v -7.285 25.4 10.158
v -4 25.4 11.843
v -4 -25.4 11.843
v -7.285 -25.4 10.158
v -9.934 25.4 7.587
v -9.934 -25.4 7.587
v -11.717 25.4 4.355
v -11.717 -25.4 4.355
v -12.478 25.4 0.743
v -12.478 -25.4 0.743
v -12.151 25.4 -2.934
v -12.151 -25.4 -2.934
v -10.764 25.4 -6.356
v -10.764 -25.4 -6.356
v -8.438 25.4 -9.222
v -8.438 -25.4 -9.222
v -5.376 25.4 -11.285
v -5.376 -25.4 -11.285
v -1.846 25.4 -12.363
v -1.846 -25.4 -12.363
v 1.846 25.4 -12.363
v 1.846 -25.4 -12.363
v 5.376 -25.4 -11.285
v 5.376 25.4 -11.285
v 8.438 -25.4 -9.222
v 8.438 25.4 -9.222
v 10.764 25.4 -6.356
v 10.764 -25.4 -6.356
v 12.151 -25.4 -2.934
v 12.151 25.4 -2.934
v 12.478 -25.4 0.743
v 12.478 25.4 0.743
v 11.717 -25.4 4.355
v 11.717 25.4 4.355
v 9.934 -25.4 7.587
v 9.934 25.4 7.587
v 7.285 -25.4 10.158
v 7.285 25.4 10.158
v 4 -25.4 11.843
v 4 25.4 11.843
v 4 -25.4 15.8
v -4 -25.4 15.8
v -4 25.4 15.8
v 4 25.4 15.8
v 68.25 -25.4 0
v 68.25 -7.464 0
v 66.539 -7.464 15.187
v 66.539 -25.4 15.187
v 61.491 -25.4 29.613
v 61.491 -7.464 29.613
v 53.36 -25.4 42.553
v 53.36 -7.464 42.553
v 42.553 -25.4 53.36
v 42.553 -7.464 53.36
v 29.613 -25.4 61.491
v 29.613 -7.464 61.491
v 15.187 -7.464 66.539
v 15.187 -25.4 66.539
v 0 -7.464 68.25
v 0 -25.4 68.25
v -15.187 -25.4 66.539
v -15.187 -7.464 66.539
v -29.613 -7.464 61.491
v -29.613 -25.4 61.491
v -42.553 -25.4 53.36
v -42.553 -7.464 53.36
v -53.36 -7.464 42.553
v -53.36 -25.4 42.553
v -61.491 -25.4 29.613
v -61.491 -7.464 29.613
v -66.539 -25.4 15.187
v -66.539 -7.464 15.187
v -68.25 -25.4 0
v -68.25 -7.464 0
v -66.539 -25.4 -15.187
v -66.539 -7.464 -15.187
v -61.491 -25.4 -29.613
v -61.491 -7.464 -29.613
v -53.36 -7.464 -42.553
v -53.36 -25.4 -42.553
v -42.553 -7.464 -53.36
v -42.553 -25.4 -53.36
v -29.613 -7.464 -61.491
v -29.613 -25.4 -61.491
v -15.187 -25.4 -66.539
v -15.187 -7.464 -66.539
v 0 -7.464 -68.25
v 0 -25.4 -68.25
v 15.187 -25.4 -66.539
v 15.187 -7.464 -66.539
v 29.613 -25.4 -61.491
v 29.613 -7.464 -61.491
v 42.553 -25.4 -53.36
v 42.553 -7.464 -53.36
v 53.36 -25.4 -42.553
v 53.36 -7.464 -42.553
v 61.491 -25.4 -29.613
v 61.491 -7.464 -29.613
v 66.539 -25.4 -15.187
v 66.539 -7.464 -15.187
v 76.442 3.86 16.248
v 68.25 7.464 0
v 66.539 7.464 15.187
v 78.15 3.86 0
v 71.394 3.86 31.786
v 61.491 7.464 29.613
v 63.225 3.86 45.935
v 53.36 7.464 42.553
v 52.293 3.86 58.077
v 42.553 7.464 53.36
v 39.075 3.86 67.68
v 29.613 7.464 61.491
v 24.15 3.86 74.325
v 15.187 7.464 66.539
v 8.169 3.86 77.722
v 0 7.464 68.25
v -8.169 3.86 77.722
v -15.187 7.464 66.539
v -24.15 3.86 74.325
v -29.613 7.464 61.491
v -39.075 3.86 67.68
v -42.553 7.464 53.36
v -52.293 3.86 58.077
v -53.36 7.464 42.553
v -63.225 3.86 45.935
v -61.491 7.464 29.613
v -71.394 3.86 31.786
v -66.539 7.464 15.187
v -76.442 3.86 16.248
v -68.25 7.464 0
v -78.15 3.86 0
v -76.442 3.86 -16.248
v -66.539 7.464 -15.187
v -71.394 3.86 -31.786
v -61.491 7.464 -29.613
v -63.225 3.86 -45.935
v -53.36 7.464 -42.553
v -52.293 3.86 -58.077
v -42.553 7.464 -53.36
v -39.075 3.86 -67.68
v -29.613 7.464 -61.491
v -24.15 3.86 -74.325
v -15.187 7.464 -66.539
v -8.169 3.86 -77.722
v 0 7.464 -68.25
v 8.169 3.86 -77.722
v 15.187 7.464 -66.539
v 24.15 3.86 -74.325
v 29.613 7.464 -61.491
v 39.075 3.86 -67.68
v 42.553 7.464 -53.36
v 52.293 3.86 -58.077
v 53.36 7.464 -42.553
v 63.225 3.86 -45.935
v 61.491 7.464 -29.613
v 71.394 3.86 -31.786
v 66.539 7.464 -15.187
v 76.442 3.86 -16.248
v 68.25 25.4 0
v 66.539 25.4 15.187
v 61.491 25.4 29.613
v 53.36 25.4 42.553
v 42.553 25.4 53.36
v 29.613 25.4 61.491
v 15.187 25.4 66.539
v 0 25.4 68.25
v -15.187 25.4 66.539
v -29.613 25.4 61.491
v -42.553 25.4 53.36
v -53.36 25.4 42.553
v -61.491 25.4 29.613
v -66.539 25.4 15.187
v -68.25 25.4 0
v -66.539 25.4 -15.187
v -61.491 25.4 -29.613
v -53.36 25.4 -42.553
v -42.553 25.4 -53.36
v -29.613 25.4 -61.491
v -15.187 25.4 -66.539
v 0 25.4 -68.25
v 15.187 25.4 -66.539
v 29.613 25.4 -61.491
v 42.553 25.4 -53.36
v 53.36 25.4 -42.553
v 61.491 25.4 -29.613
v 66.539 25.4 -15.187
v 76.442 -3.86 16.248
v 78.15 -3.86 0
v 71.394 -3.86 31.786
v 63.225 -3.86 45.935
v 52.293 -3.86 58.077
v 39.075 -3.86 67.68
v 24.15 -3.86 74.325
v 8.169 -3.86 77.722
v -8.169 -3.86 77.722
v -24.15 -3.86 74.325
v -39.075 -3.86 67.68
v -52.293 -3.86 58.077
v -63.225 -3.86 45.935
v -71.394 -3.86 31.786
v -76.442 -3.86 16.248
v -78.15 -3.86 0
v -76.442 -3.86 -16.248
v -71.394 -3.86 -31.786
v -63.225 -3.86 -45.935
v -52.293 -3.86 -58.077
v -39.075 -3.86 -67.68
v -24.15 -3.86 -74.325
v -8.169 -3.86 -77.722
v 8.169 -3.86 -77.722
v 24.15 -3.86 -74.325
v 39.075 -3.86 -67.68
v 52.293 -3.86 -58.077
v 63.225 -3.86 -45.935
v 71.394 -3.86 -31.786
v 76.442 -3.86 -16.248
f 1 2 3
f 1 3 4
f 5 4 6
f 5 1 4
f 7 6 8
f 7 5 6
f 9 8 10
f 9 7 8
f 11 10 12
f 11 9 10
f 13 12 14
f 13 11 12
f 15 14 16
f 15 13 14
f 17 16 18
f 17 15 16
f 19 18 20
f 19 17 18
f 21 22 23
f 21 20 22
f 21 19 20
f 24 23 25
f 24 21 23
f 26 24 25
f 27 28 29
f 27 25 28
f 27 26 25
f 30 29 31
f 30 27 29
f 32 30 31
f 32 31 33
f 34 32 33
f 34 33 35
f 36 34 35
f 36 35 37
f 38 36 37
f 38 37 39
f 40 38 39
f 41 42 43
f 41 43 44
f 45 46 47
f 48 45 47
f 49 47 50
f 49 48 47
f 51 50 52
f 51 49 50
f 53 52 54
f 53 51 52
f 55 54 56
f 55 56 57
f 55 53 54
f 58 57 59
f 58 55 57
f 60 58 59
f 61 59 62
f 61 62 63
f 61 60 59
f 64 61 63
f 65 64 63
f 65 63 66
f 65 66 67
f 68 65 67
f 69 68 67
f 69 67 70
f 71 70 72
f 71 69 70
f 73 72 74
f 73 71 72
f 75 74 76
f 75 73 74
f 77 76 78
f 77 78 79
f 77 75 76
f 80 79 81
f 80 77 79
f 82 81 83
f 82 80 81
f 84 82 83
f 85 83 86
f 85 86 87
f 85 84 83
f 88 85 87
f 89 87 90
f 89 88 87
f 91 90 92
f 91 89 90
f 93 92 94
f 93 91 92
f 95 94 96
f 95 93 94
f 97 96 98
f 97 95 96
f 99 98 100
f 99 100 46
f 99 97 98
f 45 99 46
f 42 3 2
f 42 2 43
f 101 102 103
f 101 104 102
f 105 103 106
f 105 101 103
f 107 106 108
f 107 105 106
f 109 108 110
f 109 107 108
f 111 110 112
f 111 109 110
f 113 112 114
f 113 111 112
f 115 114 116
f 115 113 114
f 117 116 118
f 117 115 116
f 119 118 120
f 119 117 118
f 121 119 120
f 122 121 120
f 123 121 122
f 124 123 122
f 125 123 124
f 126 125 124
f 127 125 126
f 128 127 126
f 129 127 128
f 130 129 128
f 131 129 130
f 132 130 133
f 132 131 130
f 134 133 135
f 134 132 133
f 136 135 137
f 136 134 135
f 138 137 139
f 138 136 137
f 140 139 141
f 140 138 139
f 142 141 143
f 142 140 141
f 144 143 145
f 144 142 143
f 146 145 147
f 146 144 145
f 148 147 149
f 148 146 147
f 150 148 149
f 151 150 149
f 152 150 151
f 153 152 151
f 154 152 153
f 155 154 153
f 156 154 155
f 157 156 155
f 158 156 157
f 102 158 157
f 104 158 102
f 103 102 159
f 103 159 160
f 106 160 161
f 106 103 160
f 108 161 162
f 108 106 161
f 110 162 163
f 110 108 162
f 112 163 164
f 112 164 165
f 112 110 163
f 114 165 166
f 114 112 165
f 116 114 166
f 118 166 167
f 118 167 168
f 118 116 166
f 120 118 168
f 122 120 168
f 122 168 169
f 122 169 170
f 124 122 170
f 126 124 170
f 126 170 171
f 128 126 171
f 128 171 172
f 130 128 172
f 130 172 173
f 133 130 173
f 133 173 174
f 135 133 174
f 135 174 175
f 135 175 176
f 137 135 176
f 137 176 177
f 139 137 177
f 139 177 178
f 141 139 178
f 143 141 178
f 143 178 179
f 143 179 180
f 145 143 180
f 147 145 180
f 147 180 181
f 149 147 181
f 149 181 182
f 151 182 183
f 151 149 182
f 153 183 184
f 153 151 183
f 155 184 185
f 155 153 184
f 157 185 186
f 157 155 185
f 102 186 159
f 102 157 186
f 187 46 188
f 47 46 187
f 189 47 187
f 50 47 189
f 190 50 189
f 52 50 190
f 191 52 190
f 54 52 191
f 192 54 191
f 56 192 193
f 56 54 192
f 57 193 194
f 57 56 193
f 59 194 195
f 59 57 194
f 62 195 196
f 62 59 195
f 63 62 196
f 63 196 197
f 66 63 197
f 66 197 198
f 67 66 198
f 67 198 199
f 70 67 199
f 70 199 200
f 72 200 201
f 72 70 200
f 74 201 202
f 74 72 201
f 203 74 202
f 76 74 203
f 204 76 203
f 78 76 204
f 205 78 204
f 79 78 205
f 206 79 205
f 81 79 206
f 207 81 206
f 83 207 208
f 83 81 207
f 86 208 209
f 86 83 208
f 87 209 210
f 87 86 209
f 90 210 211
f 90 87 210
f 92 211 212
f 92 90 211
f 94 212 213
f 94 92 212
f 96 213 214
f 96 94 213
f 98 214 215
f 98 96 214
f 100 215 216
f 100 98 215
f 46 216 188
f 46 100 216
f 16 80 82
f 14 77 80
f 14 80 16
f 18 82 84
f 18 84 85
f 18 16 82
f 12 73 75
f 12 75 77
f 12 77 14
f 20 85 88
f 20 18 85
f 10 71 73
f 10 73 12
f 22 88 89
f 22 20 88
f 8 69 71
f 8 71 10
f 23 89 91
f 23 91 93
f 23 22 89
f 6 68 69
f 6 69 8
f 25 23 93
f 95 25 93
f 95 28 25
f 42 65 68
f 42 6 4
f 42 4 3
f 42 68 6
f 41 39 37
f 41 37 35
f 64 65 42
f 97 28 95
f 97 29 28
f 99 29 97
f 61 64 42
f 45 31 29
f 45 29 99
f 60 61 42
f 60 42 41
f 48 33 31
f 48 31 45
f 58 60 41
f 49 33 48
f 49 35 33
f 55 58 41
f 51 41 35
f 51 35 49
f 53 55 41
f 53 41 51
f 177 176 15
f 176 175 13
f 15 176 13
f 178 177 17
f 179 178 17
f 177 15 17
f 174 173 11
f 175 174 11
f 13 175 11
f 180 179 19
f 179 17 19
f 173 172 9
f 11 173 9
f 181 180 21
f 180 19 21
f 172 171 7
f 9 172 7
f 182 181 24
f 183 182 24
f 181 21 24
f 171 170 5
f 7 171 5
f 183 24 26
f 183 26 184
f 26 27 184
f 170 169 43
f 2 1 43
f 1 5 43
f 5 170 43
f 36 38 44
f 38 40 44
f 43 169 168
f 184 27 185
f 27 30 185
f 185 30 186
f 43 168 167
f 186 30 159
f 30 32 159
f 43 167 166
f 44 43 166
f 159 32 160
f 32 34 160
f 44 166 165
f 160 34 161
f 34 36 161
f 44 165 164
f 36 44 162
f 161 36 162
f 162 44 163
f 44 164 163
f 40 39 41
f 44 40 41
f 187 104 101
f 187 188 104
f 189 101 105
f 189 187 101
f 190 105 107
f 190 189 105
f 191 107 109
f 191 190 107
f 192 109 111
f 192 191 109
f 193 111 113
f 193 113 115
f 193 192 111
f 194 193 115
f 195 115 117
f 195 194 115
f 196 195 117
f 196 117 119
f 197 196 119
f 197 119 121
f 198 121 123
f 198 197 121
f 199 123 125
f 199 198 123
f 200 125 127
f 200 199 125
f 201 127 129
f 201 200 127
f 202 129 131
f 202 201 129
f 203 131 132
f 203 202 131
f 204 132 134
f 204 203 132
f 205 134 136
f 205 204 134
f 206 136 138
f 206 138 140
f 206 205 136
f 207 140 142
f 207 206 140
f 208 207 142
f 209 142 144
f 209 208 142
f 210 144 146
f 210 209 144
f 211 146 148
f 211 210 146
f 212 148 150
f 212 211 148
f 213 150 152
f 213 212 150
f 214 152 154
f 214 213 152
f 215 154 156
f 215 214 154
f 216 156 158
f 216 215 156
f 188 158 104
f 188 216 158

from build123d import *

# Parameters (mm, degrees)
F0_R         = 68.25
F0_R_2       = 12.5
F1_DEPTH     = 25.4
F2_W         = 8
F2_H         = 15.8
F3_DEPTH     = 50.801
F4_R         = 78.15
F4_R_2       = 20
F5_DEPTH     = 7.5
F6_S5_R      = 68.25
F6_T6_DEPTH  = 112
F6_S11_R     = 68.25
F6_T12_DEPTH = 112


# Not quite as in the source:
# - a fillet or chamfer that OpenCascade refuses, or shapes differently, is made with other operations: its cross-section is extruded or revolved along the edge and cut away or added


with BuildPart() as f1:
    # F0 (on Front) → F1 (new body, symmetric)
    with BuildSketch(Plane.XZ):
        Circle(F0_R)
        Circle(F0_R_2, mode=Mode.SUBTRACT)
    extrude(amount=F1_DEPTH, both=True)

    # F2 (on face) → F3 (cut, through all)
    with BuildSketch(Plane.XZ.offset(25.4)):
        with Locations((0, 7.9)):
            Rectangle(F2_W, F2_H)
    extrude(amount=-F3_DEPTH, mode=Mode.SUBTRACT)

    # F4 (on Front) → F5 (join, symmetric)
    with BuildSketch(Plane.XZ):
        Circle(F4_R)
        Circle(F4_R_2, mode=Mode.SUBTRACT)
    extrude(amount=F5_DEPTH, both=True)

    # F6: chamfer of 10 x 3.6397023427 on 2 edges, made by hand


with BuildPart() as f6_tool2:
    # F6_s3 → F6_t4 (revolve)
    with BuildSketch(Plane.XY):
        Polygon((78.15, -3.8602976573), (68.15, -7.5), (78.15, -7.5), align=None)
    revolve(axis=Axis((0, -7.5, 0), (0, -1, 0)))

    # F6_s5 → F6_t6 (cut, symmetric)
    with BuildSketch(Plane.XZ.offset(5.7)):
        Circle(F6_S5_R)
    extrude(amount=F6_T6_DEPTH, both=True, mode=Mode.SUBTRACT)


with BuildPart() as f1_1:
    add(f1.part)

    # F6_t1: cut F6_tool2
    add(f6_tool2.part, mode=Mode.SUBTRACT)


with BuildPart() as f6_tool8:
    # F6_s9 → F6_t10 (revolve)
    with BuildSketch(Plane.XY):
        Polygon((68.15, 7.5), (78.15, 3.8602976573), (78.15, 7.5), align=None)
    revolve(axis=Axis((0, 7.5, 0), (0, -1, 0)))

    # F6_s11 → F6_t12 (cut, symmetric)
    with BuildSketch(Plane.XZ.offset(-5.7)):
        Circle(F6_S11_R)
    extrude(amount=F6_T12_DEPTH, both=True, mode=Mode.SUBTRACT)


with BuildPart() as f1_2:
    add(f1_1.part)

    # F6_t7: cut F6_tool8
    add(f6_tool8.part, mode=Mode.SUBTRACT)


solid = f1_2.part
